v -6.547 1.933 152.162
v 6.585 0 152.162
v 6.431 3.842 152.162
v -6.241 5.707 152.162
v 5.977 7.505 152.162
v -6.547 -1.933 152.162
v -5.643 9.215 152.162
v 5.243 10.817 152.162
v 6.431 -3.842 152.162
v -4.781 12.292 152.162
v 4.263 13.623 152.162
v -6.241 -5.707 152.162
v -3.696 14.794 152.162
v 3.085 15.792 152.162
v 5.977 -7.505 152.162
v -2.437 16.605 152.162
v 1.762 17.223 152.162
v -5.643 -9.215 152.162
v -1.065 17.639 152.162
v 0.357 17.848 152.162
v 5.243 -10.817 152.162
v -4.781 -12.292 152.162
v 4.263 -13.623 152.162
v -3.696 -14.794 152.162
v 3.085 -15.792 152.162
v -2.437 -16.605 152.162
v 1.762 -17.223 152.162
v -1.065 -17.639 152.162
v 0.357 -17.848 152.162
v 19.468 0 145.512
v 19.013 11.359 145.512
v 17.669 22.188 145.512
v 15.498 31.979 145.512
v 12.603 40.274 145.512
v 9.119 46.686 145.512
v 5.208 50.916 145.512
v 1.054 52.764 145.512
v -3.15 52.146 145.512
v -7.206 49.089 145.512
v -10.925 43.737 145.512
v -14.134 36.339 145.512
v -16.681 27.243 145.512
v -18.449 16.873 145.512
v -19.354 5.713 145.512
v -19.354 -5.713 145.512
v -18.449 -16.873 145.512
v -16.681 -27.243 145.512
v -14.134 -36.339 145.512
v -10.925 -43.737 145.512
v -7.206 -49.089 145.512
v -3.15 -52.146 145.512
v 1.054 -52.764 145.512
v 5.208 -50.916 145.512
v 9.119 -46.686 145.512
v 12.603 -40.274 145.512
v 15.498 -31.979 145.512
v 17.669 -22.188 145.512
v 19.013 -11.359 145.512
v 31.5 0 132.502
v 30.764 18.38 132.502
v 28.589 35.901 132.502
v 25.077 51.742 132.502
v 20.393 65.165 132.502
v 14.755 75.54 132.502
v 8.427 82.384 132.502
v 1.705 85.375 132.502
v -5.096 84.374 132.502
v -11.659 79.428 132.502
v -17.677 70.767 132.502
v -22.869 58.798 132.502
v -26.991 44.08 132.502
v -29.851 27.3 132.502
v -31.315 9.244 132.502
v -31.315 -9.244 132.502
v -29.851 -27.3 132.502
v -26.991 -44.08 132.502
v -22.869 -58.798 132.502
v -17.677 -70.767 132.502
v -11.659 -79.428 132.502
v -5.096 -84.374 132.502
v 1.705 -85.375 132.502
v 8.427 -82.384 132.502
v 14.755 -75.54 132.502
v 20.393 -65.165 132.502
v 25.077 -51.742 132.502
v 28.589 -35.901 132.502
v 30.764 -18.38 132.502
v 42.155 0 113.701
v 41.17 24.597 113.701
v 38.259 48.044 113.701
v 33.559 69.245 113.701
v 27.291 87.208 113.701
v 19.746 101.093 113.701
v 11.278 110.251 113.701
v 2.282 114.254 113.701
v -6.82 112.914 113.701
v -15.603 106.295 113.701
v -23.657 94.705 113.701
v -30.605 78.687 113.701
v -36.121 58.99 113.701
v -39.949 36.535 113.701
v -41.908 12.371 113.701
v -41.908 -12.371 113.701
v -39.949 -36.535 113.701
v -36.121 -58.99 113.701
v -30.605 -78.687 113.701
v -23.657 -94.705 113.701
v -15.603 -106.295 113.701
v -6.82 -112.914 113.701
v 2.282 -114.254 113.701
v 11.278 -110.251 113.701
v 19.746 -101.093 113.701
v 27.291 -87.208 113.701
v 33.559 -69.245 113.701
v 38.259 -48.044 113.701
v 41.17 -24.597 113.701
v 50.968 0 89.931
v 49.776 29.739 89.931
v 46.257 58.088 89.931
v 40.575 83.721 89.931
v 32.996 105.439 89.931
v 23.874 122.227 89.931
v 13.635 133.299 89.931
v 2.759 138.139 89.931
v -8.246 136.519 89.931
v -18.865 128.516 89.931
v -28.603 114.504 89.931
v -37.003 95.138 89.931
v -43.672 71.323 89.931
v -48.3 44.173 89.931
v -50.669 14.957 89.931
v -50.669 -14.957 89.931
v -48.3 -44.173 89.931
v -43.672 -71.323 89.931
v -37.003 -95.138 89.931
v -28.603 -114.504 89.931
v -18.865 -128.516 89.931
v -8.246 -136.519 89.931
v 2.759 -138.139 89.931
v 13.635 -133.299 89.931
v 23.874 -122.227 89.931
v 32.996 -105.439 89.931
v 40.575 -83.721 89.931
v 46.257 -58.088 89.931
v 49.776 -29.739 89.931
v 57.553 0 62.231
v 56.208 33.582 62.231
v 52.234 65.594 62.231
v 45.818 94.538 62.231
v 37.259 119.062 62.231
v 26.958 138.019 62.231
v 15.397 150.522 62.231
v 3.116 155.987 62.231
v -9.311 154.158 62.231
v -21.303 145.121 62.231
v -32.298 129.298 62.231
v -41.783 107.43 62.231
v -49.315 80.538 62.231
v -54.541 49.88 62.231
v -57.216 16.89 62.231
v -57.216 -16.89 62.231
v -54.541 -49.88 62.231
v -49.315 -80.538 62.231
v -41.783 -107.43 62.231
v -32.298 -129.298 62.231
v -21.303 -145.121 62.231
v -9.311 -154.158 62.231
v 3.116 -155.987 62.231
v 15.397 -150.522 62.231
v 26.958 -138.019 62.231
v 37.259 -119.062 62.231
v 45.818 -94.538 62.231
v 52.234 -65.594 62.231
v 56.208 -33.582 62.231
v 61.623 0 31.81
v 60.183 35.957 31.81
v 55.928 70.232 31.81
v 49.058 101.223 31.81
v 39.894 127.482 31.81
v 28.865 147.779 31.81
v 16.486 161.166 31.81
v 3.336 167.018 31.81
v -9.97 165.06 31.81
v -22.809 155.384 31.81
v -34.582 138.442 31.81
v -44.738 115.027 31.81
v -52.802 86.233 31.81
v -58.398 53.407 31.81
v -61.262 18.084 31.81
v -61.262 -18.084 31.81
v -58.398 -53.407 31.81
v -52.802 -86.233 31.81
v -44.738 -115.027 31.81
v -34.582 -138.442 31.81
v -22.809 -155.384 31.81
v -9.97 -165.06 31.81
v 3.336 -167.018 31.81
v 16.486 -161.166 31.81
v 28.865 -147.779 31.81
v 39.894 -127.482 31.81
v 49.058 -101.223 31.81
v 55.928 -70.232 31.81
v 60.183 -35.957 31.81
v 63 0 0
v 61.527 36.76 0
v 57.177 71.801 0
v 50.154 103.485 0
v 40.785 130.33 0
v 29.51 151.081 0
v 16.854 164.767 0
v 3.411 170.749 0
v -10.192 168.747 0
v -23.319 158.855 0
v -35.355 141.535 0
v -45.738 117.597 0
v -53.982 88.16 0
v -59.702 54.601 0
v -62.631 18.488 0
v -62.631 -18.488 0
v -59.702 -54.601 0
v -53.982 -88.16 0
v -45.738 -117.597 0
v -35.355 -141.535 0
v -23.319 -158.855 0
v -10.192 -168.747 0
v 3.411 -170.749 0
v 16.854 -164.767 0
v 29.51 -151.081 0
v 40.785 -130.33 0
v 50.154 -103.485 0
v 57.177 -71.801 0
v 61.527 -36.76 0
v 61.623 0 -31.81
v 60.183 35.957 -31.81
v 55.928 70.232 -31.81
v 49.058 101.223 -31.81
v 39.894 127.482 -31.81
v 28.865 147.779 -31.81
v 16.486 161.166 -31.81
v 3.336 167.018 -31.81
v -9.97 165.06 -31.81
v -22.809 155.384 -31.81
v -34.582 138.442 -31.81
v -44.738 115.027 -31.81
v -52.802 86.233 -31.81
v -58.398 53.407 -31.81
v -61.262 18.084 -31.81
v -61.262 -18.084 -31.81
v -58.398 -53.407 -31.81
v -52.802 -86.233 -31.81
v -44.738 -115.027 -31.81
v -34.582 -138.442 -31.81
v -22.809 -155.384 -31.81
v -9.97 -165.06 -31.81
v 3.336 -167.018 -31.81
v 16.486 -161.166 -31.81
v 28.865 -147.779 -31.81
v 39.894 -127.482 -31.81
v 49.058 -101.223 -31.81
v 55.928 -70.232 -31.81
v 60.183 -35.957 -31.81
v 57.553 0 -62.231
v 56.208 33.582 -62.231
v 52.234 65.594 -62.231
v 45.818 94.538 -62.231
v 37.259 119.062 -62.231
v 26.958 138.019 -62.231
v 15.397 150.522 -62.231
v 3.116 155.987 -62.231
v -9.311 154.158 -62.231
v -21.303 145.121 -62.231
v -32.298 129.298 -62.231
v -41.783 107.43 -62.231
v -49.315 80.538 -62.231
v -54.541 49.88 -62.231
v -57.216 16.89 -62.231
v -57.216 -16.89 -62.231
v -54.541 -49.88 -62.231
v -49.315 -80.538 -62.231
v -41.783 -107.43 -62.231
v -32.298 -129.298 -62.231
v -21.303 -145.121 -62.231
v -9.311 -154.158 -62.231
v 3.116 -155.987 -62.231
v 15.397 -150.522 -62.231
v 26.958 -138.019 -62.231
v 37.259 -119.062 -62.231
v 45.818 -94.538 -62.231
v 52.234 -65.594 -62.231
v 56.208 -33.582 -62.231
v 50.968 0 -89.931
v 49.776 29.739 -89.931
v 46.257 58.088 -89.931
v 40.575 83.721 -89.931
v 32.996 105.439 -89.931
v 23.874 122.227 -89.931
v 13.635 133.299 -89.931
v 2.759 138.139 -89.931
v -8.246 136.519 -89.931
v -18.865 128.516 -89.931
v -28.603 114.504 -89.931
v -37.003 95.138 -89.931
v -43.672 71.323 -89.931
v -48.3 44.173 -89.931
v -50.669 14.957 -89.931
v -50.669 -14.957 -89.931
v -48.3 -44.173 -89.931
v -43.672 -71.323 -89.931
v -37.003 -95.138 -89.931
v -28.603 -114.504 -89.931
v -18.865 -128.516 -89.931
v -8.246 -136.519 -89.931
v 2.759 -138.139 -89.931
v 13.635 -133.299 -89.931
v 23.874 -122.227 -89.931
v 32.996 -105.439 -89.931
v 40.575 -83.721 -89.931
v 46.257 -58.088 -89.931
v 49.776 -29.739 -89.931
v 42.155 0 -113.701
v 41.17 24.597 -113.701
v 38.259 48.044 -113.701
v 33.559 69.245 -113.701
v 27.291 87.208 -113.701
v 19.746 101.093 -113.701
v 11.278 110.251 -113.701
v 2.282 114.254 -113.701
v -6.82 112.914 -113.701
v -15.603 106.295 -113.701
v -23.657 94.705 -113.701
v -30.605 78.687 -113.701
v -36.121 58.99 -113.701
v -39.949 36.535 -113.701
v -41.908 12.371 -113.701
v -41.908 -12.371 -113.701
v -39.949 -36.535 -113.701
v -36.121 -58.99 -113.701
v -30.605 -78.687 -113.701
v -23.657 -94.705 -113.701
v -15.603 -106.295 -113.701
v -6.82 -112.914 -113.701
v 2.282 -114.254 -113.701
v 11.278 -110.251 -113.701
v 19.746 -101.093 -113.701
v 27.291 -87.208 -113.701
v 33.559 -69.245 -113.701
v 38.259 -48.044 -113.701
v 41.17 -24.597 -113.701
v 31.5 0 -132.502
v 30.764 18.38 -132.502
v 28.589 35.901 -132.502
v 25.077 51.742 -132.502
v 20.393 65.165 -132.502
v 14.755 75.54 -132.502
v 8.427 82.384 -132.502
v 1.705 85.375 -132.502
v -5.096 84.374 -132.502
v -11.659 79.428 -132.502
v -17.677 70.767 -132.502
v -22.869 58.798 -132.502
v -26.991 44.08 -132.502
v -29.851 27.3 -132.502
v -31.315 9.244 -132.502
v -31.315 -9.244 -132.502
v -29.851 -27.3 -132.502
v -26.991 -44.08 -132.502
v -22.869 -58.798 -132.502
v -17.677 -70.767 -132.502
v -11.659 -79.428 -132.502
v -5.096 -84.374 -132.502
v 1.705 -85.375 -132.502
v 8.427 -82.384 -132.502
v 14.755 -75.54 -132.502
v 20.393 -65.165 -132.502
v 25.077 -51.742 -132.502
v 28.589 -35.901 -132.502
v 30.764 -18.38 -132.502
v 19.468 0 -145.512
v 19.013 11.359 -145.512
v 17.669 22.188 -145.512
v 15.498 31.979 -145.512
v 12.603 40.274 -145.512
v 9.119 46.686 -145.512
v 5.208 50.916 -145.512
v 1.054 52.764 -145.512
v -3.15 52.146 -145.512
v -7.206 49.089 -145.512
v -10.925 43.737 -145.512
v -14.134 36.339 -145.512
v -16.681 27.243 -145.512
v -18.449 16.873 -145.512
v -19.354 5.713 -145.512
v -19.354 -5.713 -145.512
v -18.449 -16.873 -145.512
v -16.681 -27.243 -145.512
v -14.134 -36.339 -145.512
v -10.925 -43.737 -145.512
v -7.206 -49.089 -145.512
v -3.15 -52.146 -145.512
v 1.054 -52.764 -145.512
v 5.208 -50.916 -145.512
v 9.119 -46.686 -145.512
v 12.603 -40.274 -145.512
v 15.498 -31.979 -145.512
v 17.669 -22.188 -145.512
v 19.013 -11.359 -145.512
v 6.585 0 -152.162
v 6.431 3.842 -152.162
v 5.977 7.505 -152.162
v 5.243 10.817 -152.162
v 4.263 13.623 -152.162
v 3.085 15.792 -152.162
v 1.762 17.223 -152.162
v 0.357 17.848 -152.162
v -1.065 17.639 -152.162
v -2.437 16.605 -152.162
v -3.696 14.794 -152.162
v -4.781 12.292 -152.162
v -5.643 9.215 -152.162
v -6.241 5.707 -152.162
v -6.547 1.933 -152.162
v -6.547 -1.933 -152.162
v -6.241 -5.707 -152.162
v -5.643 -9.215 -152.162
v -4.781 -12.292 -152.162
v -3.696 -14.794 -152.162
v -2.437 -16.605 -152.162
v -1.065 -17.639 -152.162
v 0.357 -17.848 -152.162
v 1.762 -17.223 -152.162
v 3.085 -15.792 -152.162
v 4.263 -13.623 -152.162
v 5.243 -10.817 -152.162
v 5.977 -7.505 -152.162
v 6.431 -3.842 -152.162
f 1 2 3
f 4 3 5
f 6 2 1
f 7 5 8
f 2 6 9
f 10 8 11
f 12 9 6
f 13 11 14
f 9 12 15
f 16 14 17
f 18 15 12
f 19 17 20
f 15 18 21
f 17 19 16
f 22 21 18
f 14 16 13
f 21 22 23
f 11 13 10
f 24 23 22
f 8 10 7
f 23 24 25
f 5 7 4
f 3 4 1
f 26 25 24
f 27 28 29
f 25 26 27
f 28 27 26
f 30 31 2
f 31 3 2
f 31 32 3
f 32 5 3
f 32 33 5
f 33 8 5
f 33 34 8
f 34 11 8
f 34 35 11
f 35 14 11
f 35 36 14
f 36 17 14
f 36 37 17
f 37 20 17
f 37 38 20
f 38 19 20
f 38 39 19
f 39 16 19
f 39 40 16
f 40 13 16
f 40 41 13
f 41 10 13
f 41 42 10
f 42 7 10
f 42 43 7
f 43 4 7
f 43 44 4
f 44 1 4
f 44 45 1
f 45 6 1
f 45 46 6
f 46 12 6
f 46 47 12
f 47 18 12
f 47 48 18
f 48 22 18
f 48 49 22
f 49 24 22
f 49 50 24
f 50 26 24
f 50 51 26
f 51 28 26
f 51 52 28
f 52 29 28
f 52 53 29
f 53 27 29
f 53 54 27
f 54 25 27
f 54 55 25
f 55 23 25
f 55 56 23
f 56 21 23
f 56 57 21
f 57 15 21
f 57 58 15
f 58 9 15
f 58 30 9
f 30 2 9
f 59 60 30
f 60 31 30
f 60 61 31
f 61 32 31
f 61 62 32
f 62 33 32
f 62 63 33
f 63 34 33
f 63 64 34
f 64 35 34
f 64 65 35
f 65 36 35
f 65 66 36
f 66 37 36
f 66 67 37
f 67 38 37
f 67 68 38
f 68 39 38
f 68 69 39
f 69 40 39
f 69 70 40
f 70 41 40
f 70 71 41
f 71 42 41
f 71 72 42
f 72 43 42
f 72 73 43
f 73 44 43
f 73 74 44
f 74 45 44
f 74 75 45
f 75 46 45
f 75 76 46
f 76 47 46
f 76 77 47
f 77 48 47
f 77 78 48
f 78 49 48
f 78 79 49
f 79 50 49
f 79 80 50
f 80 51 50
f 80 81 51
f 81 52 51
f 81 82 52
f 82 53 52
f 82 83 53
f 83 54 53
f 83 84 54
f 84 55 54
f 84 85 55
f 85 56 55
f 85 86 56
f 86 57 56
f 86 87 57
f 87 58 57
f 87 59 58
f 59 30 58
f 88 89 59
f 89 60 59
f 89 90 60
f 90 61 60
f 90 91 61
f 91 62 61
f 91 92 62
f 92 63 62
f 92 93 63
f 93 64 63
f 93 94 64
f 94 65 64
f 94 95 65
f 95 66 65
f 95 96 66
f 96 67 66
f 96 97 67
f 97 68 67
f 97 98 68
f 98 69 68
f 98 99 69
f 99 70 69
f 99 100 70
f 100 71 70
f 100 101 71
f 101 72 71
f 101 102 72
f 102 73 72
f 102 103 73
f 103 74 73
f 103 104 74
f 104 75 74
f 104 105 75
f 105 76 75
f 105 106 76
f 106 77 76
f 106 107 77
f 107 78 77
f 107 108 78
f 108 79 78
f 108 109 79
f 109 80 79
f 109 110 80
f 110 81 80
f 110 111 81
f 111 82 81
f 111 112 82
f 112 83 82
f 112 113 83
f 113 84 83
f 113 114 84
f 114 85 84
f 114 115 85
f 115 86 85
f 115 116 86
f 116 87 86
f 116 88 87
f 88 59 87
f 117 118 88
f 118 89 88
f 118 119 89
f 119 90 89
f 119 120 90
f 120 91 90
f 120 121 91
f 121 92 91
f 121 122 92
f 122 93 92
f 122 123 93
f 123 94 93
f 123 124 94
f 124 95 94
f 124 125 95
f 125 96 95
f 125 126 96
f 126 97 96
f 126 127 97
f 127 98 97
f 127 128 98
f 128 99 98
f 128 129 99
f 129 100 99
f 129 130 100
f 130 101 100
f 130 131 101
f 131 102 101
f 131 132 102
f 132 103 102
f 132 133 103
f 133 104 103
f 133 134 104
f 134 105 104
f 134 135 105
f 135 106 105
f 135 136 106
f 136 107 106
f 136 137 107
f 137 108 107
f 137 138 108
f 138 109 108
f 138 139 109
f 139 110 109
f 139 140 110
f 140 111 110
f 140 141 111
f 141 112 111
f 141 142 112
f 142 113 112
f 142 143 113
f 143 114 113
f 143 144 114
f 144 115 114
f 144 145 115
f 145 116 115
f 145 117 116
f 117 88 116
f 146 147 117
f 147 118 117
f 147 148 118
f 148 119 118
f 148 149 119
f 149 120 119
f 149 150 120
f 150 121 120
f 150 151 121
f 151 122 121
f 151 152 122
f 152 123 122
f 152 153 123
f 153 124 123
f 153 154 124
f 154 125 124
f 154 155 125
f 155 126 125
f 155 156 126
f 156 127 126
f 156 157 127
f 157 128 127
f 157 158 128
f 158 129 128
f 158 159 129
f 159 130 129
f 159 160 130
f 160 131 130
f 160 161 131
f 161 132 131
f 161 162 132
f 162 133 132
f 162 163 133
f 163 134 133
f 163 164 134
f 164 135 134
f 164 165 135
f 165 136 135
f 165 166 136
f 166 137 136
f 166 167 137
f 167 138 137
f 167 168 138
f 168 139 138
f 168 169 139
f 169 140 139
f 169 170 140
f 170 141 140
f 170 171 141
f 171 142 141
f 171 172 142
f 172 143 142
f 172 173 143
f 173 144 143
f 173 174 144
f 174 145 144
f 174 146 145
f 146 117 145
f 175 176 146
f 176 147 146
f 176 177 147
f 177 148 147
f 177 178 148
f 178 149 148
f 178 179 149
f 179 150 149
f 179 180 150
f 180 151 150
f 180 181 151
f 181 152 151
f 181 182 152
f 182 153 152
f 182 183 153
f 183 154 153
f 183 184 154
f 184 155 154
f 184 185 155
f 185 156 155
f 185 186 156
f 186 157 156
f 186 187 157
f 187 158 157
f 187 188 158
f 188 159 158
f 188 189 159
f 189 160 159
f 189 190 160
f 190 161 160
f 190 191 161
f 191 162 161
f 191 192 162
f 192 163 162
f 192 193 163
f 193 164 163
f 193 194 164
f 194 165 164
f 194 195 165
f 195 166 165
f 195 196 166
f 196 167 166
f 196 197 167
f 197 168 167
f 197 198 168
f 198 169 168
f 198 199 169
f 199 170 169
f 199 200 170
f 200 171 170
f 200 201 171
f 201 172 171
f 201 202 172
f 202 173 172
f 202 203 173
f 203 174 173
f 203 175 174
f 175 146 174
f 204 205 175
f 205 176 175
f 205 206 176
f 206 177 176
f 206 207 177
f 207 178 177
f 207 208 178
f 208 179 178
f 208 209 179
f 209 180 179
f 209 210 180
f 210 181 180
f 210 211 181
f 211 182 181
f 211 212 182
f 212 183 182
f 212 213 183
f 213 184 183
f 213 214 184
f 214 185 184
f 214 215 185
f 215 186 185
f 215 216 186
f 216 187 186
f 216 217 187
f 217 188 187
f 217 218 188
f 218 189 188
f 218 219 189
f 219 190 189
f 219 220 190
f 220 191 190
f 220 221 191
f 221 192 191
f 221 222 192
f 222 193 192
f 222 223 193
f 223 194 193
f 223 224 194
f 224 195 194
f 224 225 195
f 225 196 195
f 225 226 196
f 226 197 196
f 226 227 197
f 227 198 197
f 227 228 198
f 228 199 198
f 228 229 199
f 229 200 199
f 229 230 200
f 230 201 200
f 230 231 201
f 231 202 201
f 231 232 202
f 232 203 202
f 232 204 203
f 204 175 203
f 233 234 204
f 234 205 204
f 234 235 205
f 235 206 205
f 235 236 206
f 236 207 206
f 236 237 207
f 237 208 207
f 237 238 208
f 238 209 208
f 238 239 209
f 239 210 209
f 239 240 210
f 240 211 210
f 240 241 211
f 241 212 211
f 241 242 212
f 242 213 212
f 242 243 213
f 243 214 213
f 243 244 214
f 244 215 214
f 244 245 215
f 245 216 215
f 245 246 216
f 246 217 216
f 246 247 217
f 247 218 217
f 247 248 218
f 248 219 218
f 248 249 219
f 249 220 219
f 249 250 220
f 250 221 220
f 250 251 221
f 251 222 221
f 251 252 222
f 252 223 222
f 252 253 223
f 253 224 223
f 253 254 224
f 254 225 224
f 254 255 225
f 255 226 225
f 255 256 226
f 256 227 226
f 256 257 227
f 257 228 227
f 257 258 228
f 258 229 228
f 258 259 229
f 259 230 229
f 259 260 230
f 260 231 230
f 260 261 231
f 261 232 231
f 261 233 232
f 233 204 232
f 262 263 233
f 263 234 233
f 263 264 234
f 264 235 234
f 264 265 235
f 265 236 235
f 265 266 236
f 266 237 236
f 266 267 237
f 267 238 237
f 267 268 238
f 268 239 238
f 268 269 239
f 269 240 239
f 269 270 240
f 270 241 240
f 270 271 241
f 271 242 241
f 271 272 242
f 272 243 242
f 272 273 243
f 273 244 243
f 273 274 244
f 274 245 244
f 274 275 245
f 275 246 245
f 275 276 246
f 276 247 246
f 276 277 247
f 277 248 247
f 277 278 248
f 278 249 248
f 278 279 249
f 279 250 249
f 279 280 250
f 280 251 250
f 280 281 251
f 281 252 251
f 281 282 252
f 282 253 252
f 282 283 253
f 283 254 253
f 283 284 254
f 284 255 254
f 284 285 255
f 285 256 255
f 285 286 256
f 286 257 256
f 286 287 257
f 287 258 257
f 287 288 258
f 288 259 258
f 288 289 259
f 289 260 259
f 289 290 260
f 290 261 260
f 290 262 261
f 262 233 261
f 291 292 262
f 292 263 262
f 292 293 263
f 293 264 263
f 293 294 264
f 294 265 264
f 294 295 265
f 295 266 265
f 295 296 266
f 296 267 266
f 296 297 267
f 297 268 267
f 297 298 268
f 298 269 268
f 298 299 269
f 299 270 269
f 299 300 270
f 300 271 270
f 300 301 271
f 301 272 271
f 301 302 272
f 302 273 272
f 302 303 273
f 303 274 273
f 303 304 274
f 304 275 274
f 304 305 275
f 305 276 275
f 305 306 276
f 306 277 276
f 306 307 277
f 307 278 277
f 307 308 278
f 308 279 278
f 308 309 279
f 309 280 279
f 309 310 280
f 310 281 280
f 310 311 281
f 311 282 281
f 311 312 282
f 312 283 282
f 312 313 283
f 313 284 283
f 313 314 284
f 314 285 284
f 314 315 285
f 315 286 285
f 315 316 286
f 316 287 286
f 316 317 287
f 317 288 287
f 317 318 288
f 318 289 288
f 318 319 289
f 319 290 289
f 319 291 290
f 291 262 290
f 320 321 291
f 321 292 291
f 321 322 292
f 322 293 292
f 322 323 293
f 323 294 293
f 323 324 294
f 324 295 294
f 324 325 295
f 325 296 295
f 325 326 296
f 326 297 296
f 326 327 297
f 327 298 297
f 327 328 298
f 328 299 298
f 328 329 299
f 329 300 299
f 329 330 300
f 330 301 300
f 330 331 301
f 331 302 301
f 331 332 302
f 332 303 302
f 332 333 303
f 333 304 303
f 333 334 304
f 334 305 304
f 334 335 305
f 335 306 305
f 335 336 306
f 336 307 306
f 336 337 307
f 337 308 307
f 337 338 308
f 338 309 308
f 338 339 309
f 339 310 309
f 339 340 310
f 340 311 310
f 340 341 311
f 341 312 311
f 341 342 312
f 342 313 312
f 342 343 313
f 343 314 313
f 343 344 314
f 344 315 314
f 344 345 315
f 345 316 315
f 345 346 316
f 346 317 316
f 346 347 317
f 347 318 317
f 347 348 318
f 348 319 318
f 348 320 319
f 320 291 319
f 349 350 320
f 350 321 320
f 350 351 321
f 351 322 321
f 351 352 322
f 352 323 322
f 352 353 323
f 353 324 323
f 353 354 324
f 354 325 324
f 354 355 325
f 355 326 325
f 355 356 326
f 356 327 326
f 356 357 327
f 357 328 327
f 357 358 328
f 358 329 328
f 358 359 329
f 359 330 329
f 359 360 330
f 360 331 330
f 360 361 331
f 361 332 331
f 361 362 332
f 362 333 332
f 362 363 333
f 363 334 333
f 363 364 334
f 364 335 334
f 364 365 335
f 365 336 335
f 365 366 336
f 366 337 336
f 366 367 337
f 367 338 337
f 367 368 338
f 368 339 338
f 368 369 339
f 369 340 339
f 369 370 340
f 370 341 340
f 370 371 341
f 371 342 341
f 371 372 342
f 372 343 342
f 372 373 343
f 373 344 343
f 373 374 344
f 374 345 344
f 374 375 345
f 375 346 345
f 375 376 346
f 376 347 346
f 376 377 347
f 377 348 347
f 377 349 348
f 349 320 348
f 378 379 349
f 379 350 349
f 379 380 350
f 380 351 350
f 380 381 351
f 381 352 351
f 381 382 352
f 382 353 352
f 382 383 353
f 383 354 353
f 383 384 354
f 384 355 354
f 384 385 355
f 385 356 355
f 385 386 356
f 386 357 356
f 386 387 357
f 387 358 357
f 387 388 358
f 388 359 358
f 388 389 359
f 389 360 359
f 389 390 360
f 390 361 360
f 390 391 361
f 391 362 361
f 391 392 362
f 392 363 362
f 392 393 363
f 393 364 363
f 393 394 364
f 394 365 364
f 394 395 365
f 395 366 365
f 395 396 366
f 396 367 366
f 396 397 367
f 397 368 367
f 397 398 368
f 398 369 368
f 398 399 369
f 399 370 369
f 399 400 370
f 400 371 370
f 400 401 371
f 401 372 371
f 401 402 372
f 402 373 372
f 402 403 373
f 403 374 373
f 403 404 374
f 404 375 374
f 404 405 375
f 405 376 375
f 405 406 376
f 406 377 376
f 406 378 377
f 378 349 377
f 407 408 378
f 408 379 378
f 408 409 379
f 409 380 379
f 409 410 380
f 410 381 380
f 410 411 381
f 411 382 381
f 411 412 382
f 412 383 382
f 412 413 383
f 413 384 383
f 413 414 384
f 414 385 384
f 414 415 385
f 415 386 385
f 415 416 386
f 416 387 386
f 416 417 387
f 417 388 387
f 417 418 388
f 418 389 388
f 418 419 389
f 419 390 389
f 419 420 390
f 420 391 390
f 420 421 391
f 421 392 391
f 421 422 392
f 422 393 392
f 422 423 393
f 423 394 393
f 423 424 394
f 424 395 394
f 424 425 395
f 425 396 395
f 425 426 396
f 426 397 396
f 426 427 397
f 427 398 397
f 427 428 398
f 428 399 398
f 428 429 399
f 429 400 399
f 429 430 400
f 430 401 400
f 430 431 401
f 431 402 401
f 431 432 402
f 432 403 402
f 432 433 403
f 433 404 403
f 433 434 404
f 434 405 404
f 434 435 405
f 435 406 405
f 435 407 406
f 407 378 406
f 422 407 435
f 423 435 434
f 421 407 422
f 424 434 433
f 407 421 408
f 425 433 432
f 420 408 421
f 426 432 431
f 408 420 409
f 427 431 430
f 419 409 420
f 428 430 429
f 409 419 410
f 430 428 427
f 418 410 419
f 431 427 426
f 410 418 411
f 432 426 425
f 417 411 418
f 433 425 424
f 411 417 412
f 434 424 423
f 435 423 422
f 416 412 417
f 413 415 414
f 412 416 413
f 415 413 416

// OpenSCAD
// Generated by SolidPython 1.0.1 on 2020-07-29 00:46:48


scale(v = [7, 19, 17]) {
	sphere(r = 9);
}
/***********************************************
*********      SolidPython code:      **********
************************************************
 
# import packages: SolidPython
from solid import *
from solid.utils import *
from itertools import chain, combinations, permutations


class Resize:

    def __init__(self, scad_file):
        self.scad_file = scad_file
        #self.scad_file = import_scad(scad_file)
        # cone/cylinder param:
        self.r1 = 0
        self.r2 = 0
        self.h = 0
        # rectangular prism param:
        self.w = 0
        self.l = 0
        # ellipse param:
        self.r = 0

    # import OpenScad code (file name corresponds to shape)


    # classify shape + parameters
    def assign(self, param1, param2, param3):
        if self.scad_file == 'cone.scad':
            self.r1 = param1
            self.r2 = param2
            self.h = param3
        elif self.scad_file == 'cylinder.scad':
            self.r1 = param1
            self.r2 = param2
            self.h = param3
        elif self.scad_file == 'rectangularPrism.scad':
            self.h = param1
            self.l = param2
            self.w = param3
        else:
            self.r = param1
            self.h = param2

    # resize parameters
    def iterate(self):
        x = range(3, 20, 2)
        i = 1
        if self.scad_file == 'cone.scad':
            tempList = list(permutations(x, 2))
            for temp in tempList:
                param1 = temp[0]
                param2 = temp[1]
                filepath = 'produced_scad_files/' + 'cone' + str(param1) + '_' + str(param2) + '_' + '.scad'
                scad_render_to_file(cylinder(h=param1, r1=param2, r2=0), filepath)

        elif self.scad_file == 'cylinder.scad':
            tempList = list(permutations(x, 3))
            for temp in tempList:
                param1 = temp[0]
                param2 = temp[1]
                filepath = 'produced_scad_files/' + 'cylinder' + str(param1) + '_' + str(param2) + '_' + '.scad'
                scad_render_to_file(cylinder(h=param1, r1=param2, r2=param2), filepath)

        elif self.scad_file == 'rectangularPrism.scad':
            tempList = list(permutations(x, 3))
            for temp in tempList:
                param1 = temp[0]
                param2 = temp[1]
                param3 = temp[2]
                filepath = 'produced_scad_files/' + 'rectangularPrism' + str(param1) + '_' + str(param2) + '_' + str(
                    param3) + '.scad'
                scad_render_to_file(cube(size=(param1, param2, param3)), filepath)

        elif self.scad_file == 'ellipse.scad':
            tempList = list(permutations(x, 4))
            for temp in tempList:
                param1 = temp[0]
                param2 = temp[1]
                param3 = temp[2]
                param4 = temp[3]
                filepath = 'produced_scad_files/' + 'ellipse' + str(param1) + '_' + str(param2) + '_' + str(param3) + '_' + str(param4) + '.scad'
                scad_render_to_file(scale([param1, param2, param3])(sphere(r=param4)), filepath)

    def render_to_scadfile(self):
        scad_render_to_file(scad, 'example.scad') 
 
************************************************/
